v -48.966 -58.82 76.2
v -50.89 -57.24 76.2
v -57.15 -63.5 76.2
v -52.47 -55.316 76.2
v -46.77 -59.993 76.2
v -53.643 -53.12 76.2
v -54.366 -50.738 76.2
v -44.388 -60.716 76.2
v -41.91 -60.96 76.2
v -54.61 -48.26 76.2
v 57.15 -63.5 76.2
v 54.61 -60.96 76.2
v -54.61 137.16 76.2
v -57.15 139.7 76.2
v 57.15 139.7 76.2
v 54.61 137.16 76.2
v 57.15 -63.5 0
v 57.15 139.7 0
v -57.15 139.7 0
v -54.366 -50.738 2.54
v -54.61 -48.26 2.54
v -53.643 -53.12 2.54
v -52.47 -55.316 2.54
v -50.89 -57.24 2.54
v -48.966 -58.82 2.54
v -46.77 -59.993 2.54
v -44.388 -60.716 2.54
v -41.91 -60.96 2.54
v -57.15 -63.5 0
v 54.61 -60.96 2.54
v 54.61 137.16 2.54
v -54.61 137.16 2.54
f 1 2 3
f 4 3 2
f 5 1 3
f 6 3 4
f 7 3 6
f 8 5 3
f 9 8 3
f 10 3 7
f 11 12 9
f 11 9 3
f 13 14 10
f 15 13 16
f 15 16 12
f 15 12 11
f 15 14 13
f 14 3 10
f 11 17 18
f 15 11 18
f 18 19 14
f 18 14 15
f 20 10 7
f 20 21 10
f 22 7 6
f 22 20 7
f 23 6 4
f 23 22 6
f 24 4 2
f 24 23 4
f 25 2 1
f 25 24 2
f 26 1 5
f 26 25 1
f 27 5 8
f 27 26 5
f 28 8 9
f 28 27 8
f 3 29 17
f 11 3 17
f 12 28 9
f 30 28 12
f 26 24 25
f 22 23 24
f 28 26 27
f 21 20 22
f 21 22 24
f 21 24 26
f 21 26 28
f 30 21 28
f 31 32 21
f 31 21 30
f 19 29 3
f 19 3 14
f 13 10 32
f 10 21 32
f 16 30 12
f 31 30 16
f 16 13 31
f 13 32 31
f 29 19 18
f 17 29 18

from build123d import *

# Parameters (mm, degrees)
F0_W     = 114.3
F0_H     = 203.2
F1_DEPTH = 76.2
F2_T     = -2.54
F3_R     = 12.7


with BuildPart() as f1:
    # F0 (on Top) → F1 (new body)
    with BuildSketch(Plane.XY):
        with Locations((0, 38.1)):
            Rectangle(F0_W, F0_H)
    extrude(amount=F1_DEPTH)

    # F2
    f2_openings = [f1.faces().sort_by_distance(p)[0] for p in [
        (0, 38.1, 76.2),
    ]]
    offset(amount=F2_T, openings=f2_openings)

    # F3
    f3_edges = [f1.edges().sort_by_distance(p)[0] for p in [
        (-54.61, -60.96, 39.37),
    ]]
    fillet(f3_edges, radius=F3_R)


solid = f1.part
